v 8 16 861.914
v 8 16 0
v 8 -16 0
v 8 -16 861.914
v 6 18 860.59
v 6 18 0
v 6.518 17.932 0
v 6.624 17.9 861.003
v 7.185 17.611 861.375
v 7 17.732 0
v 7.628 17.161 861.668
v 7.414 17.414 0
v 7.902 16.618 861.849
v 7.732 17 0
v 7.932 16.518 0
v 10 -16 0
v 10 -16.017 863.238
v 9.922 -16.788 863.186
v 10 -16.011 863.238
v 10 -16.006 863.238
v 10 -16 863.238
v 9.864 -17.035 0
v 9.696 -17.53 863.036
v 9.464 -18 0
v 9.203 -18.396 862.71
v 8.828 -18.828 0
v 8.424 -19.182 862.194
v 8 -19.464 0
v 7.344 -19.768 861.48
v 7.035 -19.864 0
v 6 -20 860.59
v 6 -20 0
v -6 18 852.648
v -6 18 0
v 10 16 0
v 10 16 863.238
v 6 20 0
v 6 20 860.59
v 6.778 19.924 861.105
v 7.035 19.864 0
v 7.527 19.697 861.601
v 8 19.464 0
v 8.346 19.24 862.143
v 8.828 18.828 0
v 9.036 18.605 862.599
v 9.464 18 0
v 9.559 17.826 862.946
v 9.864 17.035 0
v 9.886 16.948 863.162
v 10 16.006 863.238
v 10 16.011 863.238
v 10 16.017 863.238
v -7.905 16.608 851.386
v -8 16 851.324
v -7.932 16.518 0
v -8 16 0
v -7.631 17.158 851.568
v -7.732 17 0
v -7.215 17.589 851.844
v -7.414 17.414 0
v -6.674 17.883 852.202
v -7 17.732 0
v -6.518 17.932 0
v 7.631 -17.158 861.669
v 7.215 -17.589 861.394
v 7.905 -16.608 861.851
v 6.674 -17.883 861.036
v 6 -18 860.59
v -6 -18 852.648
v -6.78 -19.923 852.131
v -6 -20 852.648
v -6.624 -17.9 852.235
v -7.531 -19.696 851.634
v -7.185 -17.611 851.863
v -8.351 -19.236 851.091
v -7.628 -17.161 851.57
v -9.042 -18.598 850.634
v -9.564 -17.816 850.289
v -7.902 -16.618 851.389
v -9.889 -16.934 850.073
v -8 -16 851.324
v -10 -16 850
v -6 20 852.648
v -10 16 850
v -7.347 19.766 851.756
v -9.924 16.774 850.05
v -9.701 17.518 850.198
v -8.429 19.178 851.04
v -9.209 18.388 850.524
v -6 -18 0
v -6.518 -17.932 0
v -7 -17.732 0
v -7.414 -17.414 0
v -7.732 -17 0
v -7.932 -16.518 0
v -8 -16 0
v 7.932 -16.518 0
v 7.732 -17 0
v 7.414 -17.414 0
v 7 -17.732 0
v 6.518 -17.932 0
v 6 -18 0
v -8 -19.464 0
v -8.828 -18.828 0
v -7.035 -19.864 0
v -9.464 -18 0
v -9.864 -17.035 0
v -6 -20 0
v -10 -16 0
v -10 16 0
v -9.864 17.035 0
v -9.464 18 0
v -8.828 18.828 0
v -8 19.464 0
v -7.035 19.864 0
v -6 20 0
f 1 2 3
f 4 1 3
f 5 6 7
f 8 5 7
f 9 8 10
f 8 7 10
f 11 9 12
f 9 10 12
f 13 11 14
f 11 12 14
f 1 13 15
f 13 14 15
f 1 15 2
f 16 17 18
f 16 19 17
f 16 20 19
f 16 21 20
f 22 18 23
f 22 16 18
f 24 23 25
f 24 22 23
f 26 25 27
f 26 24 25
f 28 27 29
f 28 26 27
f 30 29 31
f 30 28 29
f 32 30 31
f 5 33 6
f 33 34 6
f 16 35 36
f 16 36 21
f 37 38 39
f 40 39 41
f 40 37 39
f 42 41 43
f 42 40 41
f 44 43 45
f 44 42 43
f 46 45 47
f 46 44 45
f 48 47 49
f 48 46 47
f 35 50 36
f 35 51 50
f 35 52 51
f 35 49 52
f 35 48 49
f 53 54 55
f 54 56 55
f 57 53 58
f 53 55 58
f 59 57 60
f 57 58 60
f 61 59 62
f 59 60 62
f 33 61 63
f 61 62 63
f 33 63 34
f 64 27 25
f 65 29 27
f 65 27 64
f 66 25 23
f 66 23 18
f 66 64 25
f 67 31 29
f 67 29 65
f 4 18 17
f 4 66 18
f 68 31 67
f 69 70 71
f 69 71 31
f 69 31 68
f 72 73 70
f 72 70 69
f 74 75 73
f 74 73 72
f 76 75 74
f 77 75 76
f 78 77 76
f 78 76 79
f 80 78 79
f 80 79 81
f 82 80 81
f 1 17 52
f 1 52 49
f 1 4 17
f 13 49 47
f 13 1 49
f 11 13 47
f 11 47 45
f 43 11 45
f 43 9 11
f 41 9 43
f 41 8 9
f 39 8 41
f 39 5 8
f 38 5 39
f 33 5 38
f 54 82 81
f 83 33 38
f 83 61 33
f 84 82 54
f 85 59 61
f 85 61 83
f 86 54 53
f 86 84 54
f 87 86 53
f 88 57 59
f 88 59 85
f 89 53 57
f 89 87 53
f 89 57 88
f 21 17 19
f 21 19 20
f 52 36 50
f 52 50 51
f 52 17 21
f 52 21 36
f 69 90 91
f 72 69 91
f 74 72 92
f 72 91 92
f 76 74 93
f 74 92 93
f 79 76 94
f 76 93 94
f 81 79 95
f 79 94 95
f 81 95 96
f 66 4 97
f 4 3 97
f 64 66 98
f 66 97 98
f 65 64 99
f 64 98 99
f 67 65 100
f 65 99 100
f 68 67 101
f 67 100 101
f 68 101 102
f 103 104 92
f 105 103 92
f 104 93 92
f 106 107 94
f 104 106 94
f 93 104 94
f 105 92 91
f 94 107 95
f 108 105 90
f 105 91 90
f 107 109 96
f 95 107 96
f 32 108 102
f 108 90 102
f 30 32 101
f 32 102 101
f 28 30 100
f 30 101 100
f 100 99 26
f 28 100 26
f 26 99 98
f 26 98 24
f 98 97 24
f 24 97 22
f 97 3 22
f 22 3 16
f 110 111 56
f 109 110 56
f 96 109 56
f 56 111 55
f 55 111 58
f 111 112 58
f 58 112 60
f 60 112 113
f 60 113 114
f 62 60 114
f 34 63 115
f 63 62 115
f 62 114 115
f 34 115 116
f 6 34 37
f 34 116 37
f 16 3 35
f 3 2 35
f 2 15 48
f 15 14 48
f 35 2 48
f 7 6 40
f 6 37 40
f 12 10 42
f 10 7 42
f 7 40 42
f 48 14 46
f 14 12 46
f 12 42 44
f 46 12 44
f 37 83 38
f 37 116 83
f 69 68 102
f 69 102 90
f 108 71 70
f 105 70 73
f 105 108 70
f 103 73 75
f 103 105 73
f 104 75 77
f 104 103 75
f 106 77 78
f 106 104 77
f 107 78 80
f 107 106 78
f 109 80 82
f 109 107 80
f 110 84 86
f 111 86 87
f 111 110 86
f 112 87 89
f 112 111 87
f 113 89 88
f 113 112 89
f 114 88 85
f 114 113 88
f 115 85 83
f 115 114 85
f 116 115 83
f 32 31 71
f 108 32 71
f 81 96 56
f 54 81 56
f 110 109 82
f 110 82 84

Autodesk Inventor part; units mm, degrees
ref_plane "Start Plane" through (0, 0, 0) normal (0, 0, 1) x (1, 0, 0)
ref_plane "End Plane" through (0, 0, 863.2377) normal (0, 0, 1) x (1, 0, 0)
sketch "Sketch" plane through (0, 0, 0) normal (0, 0, 1) x (1, 0, 0)
  line L0 (-10, -16) -> (-10, 16)
  line L1 (-6, 20) -> (6, 20)
  line L2 (10, 16) -> (10, -16)
  line L3 (6, -20) -> (-6, -20)
  arc A0 (-10, -16) -> (-6, -20) centre (-6, -16) ccw
  arc A1 (10, 16) -> (6, 20) centre (6, 16) ccw
  arc A2 (-6, 20) -> (-10, 16) centre (-6, 16) ccw
  arc A3 (6, -20) -> (10, -16) centre (6, -16) ccw
  arc A4 (-6, 18) -> (-8, 16) centre (-6, 16) ccw
  line L4 (-6, 18) -> (6, 18)
  arc A5 (8, 16) -> (6, 18) centre (6, 16) ccw
  line L5 (8, 16) -> (8, -16)
  arc A6 (6, -18) -> (8, -16) centre (6, -16) ccw
  line L6 (6, -18) -> (-6, -18)
  arc A7 (-8, -16) -> (-6, -18) centre (-6, -16) ccw
  line L7 (-8, -16) -> (-8, 16)
  line L8 (0, 29.1598) -> (0, -29.1598) construction
  line L9 (-15.1598, 0) -> (15.1598, 0) construction
  dimension "d7" = 4
  dimension "d9" = 20
  dimension "d11" = 40
  dimension "d12" = 2
  dimension "d15" = 10
  dimension "d16" = 20
extrude "Body" add sketch "Sketch" along normal up to surface (863.2377 mm away) from surface at 0
sketch "Sketch3" plane through (0, 0, 0) normal (0, 0, 1) x (1, 0, 0)
  line L0 (0, 0) -> (10, 0)
ref_plane "Work Plane3" through (0, 0, 0) normal (0, -1, 0) x (1, 0, 0)
ref_plane "Work Plane4" through (3644.0877, -16, 3268.5879) normal (-0.5519, 0, 0.8339) x (0.8339, 0, 0.5519)
split "Split1" plane through (3644.0877, -16, 3268.5879) removes the side toward (-0.5519, 0, 0.8339)
sketch "Sketch4" plane through (0, 0, 0) normal (0, -1, 0) x (1, 0, 0)
  line L0 (-2, 0) -> (12, 0) projected
  line L1 (-2, 863.2377) -> (12, 863.2377) projected
  dimension "d18" = 863.2377
equation "\"d7\" = G_IR"
equation "\"d9\" = G_W"
equation "\"d11\" = G_H"
equation "\"d12\" = G_T"
equation "\"d15\" = 0.5 * d9"
equation "\"d16\" = 0.5 * d11"
equation "\"d3\" = G_L"
equation "\"G_W\" = 20"
equation "\"G_H\" = 40"
equation "\"G_T\" = 2"
equation "\"G_IR\" = 4"
equation "\"G_L\" = d18"
equation "\"G_OFFSET_START\" = 0"
equation "\"G_OFFSET_END\" = 13.23771"
equation "\"d14\" = G_OFFSET_END + B_L"
equation "\"B_L\" = 850"
properties part number "ISO 4019 - 40x20x2 - 863.24" material "Steel, Mild"
